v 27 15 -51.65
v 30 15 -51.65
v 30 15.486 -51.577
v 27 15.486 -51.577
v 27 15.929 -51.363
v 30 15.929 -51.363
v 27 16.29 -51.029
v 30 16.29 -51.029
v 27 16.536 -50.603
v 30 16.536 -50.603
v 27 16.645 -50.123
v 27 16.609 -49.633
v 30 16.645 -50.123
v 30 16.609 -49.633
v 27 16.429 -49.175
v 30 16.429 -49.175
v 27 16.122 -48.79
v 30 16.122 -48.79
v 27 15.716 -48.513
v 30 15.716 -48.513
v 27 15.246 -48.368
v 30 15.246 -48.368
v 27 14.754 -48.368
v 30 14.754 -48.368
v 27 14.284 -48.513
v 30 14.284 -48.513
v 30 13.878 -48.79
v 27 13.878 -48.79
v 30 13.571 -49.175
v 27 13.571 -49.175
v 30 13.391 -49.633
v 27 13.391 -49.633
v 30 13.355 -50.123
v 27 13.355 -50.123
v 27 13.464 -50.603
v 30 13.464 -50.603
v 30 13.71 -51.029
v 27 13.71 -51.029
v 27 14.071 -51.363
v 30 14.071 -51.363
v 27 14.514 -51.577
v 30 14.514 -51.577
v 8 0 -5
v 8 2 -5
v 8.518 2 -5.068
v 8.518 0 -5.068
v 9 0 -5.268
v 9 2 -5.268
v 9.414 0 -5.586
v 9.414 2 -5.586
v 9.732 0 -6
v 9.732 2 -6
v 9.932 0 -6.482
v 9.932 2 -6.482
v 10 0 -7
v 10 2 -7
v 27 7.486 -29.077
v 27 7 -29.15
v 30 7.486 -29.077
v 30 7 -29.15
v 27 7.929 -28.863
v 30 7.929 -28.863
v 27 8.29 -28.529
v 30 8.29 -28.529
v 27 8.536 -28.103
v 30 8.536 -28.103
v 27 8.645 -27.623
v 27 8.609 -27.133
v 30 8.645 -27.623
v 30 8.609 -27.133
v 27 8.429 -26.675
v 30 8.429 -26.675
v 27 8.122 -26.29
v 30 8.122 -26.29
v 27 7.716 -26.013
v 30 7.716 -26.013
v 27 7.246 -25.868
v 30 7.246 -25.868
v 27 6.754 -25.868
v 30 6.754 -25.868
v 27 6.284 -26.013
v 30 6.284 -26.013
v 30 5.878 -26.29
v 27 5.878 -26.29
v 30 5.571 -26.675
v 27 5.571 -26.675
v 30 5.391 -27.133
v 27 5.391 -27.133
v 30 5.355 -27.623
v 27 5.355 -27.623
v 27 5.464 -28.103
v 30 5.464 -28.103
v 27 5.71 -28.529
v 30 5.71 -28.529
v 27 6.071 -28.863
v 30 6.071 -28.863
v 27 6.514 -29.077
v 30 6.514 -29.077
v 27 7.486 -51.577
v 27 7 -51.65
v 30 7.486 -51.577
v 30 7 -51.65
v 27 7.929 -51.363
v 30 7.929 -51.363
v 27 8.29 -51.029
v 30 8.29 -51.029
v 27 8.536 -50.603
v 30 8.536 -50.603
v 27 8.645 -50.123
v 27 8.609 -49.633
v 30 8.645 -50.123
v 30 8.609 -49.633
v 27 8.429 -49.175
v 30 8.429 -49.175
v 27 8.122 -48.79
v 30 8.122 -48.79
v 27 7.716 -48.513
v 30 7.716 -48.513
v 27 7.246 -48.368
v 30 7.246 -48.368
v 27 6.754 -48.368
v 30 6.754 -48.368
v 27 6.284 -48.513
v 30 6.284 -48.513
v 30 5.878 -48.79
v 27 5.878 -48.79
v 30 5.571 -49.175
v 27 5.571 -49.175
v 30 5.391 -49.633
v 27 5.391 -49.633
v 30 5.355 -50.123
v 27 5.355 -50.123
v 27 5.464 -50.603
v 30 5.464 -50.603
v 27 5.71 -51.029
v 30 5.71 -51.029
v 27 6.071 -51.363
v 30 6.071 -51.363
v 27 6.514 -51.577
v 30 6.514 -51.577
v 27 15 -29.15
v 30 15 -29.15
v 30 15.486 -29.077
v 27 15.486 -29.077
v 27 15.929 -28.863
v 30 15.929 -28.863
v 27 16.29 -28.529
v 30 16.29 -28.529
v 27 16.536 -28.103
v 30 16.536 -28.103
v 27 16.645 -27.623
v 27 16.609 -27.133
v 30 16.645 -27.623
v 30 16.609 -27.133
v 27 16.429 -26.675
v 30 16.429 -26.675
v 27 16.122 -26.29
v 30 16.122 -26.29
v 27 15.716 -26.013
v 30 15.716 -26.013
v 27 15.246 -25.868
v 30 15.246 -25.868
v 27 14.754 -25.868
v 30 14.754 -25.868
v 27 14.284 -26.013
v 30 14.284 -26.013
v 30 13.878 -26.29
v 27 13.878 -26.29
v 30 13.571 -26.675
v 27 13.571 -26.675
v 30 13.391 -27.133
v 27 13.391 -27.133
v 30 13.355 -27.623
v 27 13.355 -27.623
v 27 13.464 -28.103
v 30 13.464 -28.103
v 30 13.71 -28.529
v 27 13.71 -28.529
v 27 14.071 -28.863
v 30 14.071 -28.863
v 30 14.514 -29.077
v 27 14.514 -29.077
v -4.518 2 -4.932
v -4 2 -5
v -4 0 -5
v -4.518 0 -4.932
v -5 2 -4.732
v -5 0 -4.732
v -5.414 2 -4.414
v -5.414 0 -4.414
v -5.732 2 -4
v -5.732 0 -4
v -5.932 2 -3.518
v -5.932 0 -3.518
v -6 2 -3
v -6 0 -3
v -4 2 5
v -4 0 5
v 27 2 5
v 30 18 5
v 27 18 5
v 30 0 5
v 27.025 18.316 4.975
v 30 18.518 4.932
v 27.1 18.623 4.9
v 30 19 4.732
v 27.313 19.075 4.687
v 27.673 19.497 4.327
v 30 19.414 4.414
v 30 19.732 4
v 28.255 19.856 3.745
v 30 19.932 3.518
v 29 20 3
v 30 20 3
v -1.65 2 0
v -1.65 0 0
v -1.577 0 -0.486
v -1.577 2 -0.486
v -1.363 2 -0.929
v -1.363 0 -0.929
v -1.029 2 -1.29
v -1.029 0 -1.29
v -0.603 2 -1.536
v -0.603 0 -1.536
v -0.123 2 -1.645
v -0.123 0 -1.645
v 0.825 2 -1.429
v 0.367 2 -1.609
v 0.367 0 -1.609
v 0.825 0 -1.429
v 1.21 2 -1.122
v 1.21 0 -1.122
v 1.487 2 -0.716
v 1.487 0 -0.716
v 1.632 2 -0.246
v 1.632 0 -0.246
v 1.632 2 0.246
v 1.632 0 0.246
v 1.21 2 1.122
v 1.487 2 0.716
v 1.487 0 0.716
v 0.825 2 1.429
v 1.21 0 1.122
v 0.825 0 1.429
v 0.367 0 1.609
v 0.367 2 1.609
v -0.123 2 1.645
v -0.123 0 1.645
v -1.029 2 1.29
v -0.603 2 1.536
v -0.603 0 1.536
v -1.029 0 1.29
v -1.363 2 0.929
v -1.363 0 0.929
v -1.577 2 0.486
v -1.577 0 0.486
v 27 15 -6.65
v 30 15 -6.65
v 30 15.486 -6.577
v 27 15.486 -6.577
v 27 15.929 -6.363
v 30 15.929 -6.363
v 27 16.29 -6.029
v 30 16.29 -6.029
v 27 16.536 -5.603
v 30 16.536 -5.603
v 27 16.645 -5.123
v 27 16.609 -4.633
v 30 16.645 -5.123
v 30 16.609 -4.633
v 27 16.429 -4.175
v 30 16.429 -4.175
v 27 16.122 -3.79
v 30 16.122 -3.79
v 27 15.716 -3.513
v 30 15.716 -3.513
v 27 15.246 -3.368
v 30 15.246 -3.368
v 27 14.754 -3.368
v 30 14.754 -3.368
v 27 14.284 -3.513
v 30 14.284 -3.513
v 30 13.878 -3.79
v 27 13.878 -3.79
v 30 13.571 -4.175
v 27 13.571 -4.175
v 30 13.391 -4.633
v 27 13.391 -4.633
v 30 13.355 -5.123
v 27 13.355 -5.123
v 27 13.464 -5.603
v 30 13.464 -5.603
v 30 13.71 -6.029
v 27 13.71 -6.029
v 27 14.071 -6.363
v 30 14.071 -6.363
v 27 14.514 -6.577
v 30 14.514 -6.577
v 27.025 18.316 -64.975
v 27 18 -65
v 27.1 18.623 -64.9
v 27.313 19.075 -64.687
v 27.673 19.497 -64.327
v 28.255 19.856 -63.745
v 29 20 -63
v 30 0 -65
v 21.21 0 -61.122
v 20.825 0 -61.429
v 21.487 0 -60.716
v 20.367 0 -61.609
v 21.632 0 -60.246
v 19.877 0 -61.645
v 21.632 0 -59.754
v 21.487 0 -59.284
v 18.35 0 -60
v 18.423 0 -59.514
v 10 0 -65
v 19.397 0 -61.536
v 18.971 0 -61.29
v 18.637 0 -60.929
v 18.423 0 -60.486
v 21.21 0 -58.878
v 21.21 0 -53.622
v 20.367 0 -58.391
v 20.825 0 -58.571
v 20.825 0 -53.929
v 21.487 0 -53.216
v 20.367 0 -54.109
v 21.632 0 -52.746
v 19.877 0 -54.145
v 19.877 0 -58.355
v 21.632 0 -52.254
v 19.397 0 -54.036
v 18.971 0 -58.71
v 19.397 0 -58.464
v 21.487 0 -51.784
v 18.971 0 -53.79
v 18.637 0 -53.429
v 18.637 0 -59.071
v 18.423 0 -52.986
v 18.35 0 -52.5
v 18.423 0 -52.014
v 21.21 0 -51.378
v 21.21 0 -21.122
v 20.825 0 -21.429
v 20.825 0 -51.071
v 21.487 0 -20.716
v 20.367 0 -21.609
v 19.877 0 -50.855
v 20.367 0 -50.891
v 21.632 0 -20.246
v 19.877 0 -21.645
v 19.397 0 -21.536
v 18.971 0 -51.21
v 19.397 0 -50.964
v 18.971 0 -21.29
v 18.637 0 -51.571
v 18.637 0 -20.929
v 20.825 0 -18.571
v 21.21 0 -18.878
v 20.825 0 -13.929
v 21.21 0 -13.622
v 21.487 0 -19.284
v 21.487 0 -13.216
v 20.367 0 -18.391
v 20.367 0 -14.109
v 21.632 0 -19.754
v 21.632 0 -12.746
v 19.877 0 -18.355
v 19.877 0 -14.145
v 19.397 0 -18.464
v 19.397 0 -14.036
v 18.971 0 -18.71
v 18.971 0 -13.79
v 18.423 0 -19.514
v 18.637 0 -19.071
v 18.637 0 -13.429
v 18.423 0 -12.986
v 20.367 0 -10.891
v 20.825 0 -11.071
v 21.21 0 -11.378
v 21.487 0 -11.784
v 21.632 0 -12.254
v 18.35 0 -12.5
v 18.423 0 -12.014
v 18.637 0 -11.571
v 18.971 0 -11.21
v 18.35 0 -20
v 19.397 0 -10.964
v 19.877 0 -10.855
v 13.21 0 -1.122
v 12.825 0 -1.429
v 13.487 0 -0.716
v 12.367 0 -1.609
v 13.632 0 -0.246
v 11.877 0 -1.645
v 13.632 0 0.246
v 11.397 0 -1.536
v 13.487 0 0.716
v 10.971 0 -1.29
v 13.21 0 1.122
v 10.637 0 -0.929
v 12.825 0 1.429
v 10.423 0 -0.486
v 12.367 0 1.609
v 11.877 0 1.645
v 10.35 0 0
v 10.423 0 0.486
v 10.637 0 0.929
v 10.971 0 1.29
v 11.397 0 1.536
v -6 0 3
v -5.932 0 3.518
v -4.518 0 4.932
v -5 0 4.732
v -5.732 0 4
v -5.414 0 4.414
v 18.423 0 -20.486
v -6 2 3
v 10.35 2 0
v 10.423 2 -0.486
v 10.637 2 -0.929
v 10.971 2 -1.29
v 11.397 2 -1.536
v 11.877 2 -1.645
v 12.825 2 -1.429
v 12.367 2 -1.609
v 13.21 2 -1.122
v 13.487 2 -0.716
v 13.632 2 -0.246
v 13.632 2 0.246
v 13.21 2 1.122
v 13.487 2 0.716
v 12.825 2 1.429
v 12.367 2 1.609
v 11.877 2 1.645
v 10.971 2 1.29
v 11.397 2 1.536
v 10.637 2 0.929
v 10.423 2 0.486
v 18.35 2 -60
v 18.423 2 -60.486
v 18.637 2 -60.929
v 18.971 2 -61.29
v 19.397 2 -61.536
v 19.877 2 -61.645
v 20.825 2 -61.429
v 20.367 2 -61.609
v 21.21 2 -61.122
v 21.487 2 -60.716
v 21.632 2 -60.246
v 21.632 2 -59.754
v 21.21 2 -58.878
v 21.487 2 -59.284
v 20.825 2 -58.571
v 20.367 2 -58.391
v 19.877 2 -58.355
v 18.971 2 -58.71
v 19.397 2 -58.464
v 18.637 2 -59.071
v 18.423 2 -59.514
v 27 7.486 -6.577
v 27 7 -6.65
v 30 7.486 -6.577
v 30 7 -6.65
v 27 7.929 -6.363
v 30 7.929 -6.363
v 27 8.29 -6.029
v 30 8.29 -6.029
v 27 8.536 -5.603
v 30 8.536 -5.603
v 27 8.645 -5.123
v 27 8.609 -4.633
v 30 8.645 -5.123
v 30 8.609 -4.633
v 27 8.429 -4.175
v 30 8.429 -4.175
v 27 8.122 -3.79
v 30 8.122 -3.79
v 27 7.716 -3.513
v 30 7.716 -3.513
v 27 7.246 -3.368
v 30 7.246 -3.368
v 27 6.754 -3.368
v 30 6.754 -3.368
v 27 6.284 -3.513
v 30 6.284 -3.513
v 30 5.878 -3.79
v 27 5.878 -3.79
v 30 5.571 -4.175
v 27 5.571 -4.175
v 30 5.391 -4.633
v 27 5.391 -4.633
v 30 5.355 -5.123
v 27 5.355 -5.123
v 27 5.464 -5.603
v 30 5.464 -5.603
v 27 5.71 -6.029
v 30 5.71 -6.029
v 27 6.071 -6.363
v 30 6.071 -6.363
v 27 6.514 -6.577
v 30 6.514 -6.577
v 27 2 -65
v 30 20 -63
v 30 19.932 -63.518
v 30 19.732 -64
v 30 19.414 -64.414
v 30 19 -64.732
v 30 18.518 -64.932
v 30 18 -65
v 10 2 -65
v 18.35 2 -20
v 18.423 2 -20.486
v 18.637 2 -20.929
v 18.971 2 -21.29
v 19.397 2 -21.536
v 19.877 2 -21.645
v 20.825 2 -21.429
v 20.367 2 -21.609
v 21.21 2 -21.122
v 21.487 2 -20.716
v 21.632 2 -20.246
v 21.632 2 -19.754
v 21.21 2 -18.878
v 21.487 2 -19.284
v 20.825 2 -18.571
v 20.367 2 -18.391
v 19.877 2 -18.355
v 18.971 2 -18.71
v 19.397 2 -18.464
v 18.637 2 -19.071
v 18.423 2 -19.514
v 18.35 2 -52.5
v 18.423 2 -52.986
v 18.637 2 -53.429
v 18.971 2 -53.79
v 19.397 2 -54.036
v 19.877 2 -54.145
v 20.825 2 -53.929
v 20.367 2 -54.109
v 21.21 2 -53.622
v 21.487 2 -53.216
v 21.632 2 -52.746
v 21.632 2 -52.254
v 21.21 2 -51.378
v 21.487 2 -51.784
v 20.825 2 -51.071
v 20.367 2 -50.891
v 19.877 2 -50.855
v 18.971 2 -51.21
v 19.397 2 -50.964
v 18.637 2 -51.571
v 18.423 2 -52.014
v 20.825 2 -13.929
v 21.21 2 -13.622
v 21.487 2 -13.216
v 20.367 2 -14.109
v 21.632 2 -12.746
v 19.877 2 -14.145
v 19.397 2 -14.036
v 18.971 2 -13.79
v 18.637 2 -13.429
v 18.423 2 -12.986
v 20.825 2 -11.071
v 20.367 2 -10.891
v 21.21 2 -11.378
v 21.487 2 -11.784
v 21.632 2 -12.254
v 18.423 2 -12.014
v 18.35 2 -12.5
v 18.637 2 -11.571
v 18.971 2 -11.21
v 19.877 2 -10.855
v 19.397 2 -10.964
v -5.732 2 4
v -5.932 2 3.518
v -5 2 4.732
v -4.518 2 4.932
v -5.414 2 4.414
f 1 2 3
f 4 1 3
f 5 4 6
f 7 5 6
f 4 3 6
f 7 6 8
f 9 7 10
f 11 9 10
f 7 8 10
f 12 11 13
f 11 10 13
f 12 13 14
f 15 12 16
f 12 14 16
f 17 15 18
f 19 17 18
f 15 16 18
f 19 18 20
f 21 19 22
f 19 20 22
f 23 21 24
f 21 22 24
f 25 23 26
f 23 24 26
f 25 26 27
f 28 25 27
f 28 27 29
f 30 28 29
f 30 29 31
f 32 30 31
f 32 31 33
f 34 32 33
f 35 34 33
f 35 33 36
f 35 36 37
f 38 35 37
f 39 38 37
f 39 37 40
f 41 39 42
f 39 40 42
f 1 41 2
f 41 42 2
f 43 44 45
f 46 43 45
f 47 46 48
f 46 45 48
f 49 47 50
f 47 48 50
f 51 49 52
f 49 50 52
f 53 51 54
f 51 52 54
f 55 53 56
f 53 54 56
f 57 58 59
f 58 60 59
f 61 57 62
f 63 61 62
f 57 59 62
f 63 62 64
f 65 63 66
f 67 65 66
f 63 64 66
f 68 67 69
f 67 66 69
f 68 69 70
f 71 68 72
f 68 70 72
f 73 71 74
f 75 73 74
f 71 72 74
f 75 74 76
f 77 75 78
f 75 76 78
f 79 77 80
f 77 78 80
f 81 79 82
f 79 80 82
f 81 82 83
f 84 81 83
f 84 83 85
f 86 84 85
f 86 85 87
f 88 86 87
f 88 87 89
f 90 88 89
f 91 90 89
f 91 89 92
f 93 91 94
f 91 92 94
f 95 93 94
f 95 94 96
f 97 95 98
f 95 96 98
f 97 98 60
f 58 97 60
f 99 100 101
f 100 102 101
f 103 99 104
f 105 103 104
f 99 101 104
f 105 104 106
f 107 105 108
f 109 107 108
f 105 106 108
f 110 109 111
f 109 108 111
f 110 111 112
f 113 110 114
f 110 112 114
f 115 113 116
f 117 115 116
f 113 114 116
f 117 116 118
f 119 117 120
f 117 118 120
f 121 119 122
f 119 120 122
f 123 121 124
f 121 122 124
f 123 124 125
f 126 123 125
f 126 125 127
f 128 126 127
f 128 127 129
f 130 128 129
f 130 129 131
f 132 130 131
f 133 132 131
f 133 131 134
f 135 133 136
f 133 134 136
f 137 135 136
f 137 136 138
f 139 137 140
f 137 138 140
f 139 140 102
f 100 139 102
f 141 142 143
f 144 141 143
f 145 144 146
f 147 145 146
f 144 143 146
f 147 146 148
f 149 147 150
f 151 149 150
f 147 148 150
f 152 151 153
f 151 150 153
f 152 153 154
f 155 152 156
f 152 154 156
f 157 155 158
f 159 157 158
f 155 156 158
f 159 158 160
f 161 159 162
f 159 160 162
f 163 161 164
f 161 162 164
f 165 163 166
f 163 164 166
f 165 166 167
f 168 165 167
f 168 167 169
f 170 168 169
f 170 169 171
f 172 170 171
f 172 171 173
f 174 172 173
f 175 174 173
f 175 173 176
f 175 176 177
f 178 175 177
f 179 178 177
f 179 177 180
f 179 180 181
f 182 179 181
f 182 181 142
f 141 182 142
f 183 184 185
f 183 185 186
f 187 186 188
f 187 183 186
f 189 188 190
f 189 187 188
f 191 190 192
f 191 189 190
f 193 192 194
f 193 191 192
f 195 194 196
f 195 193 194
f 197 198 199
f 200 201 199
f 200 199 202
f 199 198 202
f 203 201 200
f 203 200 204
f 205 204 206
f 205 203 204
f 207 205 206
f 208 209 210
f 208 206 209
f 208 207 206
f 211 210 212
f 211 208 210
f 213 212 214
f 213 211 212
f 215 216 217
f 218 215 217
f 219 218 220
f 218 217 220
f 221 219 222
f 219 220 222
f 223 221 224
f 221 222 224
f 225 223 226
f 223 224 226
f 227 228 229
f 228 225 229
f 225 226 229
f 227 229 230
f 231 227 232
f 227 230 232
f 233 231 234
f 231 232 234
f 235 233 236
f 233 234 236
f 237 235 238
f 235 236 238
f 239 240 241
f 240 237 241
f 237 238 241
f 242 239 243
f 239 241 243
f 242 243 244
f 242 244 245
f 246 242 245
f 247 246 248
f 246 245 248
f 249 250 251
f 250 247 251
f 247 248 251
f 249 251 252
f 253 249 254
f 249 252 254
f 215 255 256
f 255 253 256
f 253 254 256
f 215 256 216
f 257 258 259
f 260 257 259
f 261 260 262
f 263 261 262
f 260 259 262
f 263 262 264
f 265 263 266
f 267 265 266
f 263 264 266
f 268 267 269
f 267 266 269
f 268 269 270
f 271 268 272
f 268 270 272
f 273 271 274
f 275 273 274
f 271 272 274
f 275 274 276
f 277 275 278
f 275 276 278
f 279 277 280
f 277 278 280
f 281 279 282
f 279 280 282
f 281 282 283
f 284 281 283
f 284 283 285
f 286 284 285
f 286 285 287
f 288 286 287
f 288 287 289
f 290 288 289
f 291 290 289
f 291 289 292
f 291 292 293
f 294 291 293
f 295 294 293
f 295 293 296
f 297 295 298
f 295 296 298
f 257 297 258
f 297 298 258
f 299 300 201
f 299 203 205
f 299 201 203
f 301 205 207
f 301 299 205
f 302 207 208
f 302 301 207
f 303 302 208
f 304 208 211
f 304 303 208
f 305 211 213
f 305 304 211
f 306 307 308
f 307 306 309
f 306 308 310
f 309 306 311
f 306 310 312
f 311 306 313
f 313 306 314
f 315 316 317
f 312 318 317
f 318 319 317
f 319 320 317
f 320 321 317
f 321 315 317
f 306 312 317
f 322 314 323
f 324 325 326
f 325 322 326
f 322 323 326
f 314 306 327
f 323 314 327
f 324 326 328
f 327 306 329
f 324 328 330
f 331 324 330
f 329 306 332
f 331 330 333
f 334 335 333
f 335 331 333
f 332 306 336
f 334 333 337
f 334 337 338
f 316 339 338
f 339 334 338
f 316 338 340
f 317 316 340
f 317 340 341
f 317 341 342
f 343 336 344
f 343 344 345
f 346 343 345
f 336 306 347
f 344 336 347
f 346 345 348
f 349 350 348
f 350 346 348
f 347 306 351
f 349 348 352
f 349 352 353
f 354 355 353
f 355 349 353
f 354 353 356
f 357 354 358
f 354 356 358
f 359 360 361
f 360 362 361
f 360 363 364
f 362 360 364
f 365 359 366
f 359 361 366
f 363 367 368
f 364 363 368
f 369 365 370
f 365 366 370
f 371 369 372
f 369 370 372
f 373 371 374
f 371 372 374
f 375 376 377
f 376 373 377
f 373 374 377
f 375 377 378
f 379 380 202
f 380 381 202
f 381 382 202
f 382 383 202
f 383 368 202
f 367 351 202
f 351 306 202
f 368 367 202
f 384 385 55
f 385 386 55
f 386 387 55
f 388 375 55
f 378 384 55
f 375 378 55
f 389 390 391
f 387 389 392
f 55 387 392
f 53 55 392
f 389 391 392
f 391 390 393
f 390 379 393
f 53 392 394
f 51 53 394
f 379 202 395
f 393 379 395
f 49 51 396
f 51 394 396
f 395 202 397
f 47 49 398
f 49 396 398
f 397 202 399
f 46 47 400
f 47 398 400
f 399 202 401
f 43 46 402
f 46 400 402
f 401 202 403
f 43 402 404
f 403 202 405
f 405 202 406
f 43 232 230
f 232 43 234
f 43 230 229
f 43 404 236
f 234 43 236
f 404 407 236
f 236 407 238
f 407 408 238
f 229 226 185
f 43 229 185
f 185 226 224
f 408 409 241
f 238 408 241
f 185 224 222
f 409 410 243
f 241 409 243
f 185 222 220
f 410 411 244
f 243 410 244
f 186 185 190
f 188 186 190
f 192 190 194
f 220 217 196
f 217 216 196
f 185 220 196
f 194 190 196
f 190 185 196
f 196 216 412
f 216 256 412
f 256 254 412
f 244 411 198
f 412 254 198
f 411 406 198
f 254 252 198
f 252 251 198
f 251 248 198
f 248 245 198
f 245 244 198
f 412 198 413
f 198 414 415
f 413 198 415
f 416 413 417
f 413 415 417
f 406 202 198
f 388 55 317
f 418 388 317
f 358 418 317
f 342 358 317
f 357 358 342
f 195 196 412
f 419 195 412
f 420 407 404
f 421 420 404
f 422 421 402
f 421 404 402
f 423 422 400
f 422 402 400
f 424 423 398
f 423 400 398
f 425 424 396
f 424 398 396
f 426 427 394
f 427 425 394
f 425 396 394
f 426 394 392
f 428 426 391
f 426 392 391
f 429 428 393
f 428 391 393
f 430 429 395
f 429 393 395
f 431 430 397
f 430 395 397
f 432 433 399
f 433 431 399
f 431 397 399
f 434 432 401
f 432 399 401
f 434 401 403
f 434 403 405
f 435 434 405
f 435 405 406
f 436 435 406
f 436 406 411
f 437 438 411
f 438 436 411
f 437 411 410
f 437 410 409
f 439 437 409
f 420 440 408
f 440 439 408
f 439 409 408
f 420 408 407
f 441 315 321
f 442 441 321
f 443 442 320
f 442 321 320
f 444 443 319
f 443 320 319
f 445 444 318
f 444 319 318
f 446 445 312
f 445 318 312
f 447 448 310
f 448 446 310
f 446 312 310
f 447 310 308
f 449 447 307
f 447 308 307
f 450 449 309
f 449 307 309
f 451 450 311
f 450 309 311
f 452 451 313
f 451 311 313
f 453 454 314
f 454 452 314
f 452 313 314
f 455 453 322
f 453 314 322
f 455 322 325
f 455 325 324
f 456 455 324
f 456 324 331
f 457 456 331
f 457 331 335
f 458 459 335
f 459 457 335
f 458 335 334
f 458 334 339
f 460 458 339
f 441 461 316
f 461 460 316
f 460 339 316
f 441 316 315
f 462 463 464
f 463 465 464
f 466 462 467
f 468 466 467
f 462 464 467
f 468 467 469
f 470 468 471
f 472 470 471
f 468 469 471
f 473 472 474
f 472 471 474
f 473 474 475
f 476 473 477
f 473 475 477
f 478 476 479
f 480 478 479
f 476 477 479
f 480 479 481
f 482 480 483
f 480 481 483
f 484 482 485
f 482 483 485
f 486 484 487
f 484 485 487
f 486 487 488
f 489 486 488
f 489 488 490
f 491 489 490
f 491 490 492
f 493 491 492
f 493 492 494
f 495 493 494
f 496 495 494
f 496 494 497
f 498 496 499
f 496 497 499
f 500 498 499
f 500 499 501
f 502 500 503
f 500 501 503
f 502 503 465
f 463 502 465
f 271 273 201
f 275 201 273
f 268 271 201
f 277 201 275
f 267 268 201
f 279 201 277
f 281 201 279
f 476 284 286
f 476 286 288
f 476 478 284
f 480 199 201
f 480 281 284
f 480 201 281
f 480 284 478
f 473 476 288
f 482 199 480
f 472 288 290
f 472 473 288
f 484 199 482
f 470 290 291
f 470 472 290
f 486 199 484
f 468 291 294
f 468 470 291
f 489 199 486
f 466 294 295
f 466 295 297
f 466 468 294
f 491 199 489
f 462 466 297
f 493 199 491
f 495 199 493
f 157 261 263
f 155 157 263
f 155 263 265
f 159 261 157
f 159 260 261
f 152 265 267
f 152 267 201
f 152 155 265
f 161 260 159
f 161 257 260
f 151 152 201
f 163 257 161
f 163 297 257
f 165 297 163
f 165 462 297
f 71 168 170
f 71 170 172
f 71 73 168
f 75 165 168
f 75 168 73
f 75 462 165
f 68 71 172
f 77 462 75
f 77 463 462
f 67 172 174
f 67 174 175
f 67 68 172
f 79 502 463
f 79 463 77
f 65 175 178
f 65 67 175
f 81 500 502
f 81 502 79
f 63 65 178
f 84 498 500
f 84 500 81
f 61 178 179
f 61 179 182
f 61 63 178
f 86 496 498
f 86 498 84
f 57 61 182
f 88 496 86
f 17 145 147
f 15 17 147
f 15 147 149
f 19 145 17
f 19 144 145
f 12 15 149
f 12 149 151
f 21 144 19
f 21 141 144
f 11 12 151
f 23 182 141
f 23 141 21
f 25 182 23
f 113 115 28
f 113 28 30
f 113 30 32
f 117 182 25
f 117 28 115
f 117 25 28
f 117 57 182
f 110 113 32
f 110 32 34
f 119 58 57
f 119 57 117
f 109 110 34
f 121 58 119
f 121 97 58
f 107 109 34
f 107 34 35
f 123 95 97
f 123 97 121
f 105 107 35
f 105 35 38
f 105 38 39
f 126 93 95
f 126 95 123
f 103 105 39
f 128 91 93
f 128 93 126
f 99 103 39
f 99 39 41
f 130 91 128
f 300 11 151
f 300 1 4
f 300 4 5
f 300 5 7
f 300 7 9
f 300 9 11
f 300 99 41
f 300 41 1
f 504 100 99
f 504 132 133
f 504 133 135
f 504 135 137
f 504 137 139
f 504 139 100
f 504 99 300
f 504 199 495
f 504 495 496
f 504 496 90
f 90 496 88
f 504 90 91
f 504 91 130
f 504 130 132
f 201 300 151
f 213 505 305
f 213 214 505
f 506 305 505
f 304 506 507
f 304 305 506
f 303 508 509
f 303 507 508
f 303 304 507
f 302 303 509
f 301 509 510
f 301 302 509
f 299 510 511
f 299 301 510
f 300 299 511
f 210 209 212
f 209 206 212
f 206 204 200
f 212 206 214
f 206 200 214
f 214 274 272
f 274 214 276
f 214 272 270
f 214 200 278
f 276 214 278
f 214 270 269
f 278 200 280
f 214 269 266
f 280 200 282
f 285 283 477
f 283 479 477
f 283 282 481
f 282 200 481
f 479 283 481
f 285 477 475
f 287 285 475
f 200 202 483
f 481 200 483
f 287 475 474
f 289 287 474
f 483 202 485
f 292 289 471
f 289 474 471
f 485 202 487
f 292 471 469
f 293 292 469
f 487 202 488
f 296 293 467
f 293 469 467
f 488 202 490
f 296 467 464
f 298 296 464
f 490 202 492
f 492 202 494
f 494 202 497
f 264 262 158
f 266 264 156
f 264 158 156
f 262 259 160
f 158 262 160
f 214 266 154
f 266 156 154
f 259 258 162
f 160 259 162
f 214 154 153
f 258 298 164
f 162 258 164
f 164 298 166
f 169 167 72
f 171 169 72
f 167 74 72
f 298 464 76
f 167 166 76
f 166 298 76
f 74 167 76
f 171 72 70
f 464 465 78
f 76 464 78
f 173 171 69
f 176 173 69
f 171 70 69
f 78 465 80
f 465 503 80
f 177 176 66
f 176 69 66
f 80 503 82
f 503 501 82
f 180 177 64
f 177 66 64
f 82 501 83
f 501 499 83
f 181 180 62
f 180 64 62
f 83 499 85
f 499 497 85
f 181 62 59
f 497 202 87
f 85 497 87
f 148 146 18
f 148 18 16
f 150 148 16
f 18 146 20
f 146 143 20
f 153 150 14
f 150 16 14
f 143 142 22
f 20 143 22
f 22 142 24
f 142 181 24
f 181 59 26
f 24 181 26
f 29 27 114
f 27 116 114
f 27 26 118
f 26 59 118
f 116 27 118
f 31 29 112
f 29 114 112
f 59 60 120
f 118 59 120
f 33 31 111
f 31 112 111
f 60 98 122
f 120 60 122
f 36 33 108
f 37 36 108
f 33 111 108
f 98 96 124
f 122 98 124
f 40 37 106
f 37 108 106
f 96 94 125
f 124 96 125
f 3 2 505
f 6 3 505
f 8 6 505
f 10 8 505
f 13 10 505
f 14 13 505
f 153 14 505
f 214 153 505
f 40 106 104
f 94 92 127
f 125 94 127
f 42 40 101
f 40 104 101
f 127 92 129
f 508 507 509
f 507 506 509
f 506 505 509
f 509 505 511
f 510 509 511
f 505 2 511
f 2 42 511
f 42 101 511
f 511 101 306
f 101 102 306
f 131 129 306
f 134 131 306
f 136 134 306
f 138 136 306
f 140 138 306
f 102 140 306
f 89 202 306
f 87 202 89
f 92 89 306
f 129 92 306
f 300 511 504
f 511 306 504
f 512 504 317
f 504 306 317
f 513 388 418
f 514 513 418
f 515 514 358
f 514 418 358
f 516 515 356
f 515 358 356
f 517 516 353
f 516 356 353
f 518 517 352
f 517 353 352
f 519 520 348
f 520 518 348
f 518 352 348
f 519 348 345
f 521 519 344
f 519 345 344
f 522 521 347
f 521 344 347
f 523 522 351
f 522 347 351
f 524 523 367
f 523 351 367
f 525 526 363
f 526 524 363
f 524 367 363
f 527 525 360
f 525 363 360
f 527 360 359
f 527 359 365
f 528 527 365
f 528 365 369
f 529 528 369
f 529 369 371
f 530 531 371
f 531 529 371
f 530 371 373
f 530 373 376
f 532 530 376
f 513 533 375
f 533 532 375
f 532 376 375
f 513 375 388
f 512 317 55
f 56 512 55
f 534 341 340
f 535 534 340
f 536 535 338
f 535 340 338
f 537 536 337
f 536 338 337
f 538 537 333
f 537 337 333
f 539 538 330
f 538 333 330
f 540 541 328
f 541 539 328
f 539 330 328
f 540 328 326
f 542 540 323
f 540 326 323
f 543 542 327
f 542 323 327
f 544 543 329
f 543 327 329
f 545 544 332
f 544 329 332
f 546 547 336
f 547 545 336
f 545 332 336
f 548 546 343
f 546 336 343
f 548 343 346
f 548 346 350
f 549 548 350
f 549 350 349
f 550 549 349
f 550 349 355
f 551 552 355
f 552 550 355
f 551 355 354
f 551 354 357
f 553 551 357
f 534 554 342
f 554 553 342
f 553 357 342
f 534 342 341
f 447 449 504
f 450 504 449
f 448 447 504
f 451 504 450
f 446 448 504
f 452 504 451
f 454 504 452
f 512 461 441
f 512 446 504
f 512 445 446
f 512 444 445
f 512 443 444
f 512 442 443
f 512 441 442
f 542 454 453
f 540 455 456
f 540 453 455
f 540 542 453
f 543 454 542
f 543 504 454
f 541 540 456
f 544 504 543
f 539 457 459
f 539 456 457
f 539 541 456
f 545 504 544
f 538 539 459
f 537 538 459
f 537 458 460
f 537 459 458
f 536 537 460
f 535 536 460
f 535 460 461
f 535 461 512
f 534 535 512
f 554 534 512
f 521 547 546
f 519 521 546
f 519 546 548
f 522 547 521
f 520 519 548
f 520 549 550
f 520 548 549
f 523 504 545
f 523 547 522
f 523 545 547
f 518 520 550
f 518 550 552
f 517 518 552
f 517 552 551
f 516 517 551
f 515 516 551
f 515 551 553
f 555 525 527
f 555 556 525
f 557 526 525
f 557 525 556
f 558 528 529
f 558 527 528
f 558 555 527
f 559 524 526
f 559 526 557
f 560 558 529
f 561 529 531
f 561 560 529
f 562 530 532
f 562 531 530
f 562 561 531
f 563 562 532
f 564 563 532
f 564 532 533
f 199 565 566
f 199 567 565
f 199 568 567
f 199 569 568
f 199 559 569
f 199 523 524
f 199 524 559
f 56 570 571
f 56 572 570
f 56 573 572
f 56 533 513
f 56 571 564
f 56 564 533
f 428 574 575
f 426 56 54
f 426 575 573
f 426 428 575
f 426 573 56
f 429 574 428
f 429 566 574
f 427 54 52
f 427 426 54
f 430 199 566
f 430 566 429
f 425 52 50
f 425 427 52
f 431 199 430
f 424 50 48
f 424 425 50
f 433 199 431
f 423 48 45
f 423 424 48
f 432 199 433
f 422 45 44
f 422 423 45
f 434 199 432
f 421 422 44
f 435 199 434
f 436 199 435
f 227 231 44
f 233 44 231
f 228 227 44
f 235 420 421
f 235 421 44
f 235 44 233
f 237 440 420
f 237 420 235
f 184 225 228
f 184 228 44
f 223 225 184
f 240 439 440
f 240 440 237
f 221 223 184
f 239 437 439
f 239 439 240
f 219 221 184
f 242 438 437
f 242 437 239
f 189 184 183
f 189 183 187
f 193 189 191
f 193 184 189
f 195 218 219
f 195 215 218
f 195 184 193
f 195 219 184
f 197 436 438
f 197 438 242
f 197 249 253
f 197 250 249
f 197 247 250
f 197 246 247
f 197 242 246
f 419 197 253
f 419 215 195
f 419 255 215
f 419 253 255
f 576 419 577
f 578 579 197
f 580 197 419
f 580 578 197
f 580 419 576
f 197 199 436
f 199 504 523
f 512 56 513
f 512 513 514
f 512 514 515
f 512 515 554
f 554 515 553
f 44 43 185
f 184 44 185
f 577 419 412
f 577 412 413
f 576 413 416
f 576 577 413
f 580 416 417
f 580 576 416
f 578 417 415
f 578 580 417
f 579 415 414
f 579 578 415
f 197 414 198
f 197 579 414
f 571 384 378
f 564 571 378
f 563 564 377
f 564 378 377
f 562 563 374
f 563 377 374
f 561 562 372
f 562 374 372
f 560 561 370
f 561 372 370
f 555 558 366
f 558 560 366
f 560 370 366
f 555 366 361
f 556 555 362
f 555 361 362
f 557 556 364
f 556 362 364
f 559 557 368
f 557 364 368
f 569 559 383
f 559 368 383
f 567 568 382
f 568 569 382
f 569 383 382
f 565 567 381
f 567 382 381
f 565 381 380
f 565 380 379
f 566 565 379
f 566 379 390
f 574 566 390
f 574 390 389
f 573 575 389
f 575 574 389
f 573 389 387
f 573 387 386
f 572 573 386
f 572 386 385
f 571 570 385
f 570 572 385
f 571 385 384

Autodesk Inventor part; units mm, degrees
ref_plane "YZ Plane" through (0, 0, 0) normal (1, 0, 0) x (0, 1, 0)
ref_plane "XZ Plane" through (0, 0, 0) normal (0, 1, 0) x (-1, 0, 0)
ref_plane "XY Plane" through (0, 0, 0) normal (0, 0, 1) x (1, 0, 0)
sketch "Sketch1" plane through (0, 0, 0) normal (0, 1, 0) x (-1, 0, 0)
  circle A0 centre (0, 0) radius 1.65
  circle A1 centre (-12, 0) radius 1.65
  circle A2 centre (-20, -12.5) radius 1.65
  circle A3 centre (-20, -52.5) radius 1.65
  line L0 (-10, -30) -> (-30, -30)
  line L1 (-30, -30) -> (-30, 5)
  line L2 (-30, 5) -> (-10, 5)
  line L3 (-10, 5) -> (-10, -30)
  line L4 (-10, -30) -> (-30, 5) construction
  line L5 (-30, -30) -> (-10, 5) construction
  line L6 (-30, -5) -> (6, -5)
  line L7 (6, -5) -> (6, 5)
  line L8 (6, 5) -> (-30, 5)
  line L9 (-30, 5) -> (-30, -5)
  line L10 (-30, -5) -> (6, 5) construction
  line L11 (6, -5) -> (-30, 5) construction
  line L12 (-10, -30) -> (-30, -30)
  line L13 (-30, -30) -> (-30, -65)
  line L14 (-30, -65) -> (-10, -65)
  line L15 (-10, -65) -> (-10, -30)
  line L16 (-30, 5) -> (-27, 5)
  line L17 (-27, 5) -> (-27, -65)
  line L18 (-27, -65) -> (-30, -65)
  line L19 (-30, -65) -> (-30, 5)
  circle A4 centre (-20, -20) radius 1.65
  circle A5 centre (-20, -60) radius 1.65
  point P0 (-10, -5)
  dimension "d0" = 3.3
  dimension "d1" = 3.3
  dimension "d2" = 12
  dimension "d3" = 3.3
  dimension "d4" = 12.5
  dimension "d5" = 20
  dimension "d6" = 3.3
  dimension "d7" = 40
  dimension "d8" = 20
  dimension "d9" = 35
  dimension "d25" = 3.3
  dimension "d26" = 20
  dimension "d27" = 3.3
  dimension "d28" = 40
extrude "Extrusion1" add sketch "Sketch1" along normal blind 2 contours L15 L14 L17 L0 | L0 L17 L6 L3 | L6 L17 L2 L3 | L3 L8 L7 L6
extrude "Extrusion2" add sketch "Sketch1" along normal blind 20 contours L17 L14 L13 L0 | L0 L1 L6 L17 | L6 L1 L2 L17
sketch "Sketch2" plane through (30, 0, 5) normal (1, 0, 0) x (0, 0, -1)
  circle A0 centre (10, 15) radius 1.65
  line L0 (0, 0) -> (0, 20) projected
  circle A1 centre (55, 15) radius 1.65
  line L1 (70, 0) -> (70, 20) projected
  circle A2 centre (32.5, 15) radius 1.65
  line L2 (0, 20) -> (70, 20) projected
  line L3 (0, 2) -> (0, 20) projected
  line L4 (0, 11) -> (70, 11)
  circle A3 centre (10, 7) radius 1.65
  circle A4 centre (55, 7) radius 1.65
  circle A5 centre (32.5, 7) radius 1.65
  point P0 (5, 0)
  point P1 (70, 10)
  dimension "d14" = 3.3
  dimension "d15" = 10
  dimension "d16" = 3.3
  dimension "d18" = 3.3
  dimension "d21" = 5
  dimension "d22" = 5
  dimension "d23" = 5
  dimension "d24" = 15
extrude "Extrusion3" cut sketch "Sketch2" against normal blind 20 contours A0 | A1 | A2 | A3 | A4 | A5
fillet "Fillet1" radius 2 6 edges at (-6, 1, -5) (10, 1, -5) (27, 20, -30) (28.5, 20, 5) (28.5, 20, -65) (-6, 1, 5)
properties part number "Holder Conveyor Kiri_3DPrint"
